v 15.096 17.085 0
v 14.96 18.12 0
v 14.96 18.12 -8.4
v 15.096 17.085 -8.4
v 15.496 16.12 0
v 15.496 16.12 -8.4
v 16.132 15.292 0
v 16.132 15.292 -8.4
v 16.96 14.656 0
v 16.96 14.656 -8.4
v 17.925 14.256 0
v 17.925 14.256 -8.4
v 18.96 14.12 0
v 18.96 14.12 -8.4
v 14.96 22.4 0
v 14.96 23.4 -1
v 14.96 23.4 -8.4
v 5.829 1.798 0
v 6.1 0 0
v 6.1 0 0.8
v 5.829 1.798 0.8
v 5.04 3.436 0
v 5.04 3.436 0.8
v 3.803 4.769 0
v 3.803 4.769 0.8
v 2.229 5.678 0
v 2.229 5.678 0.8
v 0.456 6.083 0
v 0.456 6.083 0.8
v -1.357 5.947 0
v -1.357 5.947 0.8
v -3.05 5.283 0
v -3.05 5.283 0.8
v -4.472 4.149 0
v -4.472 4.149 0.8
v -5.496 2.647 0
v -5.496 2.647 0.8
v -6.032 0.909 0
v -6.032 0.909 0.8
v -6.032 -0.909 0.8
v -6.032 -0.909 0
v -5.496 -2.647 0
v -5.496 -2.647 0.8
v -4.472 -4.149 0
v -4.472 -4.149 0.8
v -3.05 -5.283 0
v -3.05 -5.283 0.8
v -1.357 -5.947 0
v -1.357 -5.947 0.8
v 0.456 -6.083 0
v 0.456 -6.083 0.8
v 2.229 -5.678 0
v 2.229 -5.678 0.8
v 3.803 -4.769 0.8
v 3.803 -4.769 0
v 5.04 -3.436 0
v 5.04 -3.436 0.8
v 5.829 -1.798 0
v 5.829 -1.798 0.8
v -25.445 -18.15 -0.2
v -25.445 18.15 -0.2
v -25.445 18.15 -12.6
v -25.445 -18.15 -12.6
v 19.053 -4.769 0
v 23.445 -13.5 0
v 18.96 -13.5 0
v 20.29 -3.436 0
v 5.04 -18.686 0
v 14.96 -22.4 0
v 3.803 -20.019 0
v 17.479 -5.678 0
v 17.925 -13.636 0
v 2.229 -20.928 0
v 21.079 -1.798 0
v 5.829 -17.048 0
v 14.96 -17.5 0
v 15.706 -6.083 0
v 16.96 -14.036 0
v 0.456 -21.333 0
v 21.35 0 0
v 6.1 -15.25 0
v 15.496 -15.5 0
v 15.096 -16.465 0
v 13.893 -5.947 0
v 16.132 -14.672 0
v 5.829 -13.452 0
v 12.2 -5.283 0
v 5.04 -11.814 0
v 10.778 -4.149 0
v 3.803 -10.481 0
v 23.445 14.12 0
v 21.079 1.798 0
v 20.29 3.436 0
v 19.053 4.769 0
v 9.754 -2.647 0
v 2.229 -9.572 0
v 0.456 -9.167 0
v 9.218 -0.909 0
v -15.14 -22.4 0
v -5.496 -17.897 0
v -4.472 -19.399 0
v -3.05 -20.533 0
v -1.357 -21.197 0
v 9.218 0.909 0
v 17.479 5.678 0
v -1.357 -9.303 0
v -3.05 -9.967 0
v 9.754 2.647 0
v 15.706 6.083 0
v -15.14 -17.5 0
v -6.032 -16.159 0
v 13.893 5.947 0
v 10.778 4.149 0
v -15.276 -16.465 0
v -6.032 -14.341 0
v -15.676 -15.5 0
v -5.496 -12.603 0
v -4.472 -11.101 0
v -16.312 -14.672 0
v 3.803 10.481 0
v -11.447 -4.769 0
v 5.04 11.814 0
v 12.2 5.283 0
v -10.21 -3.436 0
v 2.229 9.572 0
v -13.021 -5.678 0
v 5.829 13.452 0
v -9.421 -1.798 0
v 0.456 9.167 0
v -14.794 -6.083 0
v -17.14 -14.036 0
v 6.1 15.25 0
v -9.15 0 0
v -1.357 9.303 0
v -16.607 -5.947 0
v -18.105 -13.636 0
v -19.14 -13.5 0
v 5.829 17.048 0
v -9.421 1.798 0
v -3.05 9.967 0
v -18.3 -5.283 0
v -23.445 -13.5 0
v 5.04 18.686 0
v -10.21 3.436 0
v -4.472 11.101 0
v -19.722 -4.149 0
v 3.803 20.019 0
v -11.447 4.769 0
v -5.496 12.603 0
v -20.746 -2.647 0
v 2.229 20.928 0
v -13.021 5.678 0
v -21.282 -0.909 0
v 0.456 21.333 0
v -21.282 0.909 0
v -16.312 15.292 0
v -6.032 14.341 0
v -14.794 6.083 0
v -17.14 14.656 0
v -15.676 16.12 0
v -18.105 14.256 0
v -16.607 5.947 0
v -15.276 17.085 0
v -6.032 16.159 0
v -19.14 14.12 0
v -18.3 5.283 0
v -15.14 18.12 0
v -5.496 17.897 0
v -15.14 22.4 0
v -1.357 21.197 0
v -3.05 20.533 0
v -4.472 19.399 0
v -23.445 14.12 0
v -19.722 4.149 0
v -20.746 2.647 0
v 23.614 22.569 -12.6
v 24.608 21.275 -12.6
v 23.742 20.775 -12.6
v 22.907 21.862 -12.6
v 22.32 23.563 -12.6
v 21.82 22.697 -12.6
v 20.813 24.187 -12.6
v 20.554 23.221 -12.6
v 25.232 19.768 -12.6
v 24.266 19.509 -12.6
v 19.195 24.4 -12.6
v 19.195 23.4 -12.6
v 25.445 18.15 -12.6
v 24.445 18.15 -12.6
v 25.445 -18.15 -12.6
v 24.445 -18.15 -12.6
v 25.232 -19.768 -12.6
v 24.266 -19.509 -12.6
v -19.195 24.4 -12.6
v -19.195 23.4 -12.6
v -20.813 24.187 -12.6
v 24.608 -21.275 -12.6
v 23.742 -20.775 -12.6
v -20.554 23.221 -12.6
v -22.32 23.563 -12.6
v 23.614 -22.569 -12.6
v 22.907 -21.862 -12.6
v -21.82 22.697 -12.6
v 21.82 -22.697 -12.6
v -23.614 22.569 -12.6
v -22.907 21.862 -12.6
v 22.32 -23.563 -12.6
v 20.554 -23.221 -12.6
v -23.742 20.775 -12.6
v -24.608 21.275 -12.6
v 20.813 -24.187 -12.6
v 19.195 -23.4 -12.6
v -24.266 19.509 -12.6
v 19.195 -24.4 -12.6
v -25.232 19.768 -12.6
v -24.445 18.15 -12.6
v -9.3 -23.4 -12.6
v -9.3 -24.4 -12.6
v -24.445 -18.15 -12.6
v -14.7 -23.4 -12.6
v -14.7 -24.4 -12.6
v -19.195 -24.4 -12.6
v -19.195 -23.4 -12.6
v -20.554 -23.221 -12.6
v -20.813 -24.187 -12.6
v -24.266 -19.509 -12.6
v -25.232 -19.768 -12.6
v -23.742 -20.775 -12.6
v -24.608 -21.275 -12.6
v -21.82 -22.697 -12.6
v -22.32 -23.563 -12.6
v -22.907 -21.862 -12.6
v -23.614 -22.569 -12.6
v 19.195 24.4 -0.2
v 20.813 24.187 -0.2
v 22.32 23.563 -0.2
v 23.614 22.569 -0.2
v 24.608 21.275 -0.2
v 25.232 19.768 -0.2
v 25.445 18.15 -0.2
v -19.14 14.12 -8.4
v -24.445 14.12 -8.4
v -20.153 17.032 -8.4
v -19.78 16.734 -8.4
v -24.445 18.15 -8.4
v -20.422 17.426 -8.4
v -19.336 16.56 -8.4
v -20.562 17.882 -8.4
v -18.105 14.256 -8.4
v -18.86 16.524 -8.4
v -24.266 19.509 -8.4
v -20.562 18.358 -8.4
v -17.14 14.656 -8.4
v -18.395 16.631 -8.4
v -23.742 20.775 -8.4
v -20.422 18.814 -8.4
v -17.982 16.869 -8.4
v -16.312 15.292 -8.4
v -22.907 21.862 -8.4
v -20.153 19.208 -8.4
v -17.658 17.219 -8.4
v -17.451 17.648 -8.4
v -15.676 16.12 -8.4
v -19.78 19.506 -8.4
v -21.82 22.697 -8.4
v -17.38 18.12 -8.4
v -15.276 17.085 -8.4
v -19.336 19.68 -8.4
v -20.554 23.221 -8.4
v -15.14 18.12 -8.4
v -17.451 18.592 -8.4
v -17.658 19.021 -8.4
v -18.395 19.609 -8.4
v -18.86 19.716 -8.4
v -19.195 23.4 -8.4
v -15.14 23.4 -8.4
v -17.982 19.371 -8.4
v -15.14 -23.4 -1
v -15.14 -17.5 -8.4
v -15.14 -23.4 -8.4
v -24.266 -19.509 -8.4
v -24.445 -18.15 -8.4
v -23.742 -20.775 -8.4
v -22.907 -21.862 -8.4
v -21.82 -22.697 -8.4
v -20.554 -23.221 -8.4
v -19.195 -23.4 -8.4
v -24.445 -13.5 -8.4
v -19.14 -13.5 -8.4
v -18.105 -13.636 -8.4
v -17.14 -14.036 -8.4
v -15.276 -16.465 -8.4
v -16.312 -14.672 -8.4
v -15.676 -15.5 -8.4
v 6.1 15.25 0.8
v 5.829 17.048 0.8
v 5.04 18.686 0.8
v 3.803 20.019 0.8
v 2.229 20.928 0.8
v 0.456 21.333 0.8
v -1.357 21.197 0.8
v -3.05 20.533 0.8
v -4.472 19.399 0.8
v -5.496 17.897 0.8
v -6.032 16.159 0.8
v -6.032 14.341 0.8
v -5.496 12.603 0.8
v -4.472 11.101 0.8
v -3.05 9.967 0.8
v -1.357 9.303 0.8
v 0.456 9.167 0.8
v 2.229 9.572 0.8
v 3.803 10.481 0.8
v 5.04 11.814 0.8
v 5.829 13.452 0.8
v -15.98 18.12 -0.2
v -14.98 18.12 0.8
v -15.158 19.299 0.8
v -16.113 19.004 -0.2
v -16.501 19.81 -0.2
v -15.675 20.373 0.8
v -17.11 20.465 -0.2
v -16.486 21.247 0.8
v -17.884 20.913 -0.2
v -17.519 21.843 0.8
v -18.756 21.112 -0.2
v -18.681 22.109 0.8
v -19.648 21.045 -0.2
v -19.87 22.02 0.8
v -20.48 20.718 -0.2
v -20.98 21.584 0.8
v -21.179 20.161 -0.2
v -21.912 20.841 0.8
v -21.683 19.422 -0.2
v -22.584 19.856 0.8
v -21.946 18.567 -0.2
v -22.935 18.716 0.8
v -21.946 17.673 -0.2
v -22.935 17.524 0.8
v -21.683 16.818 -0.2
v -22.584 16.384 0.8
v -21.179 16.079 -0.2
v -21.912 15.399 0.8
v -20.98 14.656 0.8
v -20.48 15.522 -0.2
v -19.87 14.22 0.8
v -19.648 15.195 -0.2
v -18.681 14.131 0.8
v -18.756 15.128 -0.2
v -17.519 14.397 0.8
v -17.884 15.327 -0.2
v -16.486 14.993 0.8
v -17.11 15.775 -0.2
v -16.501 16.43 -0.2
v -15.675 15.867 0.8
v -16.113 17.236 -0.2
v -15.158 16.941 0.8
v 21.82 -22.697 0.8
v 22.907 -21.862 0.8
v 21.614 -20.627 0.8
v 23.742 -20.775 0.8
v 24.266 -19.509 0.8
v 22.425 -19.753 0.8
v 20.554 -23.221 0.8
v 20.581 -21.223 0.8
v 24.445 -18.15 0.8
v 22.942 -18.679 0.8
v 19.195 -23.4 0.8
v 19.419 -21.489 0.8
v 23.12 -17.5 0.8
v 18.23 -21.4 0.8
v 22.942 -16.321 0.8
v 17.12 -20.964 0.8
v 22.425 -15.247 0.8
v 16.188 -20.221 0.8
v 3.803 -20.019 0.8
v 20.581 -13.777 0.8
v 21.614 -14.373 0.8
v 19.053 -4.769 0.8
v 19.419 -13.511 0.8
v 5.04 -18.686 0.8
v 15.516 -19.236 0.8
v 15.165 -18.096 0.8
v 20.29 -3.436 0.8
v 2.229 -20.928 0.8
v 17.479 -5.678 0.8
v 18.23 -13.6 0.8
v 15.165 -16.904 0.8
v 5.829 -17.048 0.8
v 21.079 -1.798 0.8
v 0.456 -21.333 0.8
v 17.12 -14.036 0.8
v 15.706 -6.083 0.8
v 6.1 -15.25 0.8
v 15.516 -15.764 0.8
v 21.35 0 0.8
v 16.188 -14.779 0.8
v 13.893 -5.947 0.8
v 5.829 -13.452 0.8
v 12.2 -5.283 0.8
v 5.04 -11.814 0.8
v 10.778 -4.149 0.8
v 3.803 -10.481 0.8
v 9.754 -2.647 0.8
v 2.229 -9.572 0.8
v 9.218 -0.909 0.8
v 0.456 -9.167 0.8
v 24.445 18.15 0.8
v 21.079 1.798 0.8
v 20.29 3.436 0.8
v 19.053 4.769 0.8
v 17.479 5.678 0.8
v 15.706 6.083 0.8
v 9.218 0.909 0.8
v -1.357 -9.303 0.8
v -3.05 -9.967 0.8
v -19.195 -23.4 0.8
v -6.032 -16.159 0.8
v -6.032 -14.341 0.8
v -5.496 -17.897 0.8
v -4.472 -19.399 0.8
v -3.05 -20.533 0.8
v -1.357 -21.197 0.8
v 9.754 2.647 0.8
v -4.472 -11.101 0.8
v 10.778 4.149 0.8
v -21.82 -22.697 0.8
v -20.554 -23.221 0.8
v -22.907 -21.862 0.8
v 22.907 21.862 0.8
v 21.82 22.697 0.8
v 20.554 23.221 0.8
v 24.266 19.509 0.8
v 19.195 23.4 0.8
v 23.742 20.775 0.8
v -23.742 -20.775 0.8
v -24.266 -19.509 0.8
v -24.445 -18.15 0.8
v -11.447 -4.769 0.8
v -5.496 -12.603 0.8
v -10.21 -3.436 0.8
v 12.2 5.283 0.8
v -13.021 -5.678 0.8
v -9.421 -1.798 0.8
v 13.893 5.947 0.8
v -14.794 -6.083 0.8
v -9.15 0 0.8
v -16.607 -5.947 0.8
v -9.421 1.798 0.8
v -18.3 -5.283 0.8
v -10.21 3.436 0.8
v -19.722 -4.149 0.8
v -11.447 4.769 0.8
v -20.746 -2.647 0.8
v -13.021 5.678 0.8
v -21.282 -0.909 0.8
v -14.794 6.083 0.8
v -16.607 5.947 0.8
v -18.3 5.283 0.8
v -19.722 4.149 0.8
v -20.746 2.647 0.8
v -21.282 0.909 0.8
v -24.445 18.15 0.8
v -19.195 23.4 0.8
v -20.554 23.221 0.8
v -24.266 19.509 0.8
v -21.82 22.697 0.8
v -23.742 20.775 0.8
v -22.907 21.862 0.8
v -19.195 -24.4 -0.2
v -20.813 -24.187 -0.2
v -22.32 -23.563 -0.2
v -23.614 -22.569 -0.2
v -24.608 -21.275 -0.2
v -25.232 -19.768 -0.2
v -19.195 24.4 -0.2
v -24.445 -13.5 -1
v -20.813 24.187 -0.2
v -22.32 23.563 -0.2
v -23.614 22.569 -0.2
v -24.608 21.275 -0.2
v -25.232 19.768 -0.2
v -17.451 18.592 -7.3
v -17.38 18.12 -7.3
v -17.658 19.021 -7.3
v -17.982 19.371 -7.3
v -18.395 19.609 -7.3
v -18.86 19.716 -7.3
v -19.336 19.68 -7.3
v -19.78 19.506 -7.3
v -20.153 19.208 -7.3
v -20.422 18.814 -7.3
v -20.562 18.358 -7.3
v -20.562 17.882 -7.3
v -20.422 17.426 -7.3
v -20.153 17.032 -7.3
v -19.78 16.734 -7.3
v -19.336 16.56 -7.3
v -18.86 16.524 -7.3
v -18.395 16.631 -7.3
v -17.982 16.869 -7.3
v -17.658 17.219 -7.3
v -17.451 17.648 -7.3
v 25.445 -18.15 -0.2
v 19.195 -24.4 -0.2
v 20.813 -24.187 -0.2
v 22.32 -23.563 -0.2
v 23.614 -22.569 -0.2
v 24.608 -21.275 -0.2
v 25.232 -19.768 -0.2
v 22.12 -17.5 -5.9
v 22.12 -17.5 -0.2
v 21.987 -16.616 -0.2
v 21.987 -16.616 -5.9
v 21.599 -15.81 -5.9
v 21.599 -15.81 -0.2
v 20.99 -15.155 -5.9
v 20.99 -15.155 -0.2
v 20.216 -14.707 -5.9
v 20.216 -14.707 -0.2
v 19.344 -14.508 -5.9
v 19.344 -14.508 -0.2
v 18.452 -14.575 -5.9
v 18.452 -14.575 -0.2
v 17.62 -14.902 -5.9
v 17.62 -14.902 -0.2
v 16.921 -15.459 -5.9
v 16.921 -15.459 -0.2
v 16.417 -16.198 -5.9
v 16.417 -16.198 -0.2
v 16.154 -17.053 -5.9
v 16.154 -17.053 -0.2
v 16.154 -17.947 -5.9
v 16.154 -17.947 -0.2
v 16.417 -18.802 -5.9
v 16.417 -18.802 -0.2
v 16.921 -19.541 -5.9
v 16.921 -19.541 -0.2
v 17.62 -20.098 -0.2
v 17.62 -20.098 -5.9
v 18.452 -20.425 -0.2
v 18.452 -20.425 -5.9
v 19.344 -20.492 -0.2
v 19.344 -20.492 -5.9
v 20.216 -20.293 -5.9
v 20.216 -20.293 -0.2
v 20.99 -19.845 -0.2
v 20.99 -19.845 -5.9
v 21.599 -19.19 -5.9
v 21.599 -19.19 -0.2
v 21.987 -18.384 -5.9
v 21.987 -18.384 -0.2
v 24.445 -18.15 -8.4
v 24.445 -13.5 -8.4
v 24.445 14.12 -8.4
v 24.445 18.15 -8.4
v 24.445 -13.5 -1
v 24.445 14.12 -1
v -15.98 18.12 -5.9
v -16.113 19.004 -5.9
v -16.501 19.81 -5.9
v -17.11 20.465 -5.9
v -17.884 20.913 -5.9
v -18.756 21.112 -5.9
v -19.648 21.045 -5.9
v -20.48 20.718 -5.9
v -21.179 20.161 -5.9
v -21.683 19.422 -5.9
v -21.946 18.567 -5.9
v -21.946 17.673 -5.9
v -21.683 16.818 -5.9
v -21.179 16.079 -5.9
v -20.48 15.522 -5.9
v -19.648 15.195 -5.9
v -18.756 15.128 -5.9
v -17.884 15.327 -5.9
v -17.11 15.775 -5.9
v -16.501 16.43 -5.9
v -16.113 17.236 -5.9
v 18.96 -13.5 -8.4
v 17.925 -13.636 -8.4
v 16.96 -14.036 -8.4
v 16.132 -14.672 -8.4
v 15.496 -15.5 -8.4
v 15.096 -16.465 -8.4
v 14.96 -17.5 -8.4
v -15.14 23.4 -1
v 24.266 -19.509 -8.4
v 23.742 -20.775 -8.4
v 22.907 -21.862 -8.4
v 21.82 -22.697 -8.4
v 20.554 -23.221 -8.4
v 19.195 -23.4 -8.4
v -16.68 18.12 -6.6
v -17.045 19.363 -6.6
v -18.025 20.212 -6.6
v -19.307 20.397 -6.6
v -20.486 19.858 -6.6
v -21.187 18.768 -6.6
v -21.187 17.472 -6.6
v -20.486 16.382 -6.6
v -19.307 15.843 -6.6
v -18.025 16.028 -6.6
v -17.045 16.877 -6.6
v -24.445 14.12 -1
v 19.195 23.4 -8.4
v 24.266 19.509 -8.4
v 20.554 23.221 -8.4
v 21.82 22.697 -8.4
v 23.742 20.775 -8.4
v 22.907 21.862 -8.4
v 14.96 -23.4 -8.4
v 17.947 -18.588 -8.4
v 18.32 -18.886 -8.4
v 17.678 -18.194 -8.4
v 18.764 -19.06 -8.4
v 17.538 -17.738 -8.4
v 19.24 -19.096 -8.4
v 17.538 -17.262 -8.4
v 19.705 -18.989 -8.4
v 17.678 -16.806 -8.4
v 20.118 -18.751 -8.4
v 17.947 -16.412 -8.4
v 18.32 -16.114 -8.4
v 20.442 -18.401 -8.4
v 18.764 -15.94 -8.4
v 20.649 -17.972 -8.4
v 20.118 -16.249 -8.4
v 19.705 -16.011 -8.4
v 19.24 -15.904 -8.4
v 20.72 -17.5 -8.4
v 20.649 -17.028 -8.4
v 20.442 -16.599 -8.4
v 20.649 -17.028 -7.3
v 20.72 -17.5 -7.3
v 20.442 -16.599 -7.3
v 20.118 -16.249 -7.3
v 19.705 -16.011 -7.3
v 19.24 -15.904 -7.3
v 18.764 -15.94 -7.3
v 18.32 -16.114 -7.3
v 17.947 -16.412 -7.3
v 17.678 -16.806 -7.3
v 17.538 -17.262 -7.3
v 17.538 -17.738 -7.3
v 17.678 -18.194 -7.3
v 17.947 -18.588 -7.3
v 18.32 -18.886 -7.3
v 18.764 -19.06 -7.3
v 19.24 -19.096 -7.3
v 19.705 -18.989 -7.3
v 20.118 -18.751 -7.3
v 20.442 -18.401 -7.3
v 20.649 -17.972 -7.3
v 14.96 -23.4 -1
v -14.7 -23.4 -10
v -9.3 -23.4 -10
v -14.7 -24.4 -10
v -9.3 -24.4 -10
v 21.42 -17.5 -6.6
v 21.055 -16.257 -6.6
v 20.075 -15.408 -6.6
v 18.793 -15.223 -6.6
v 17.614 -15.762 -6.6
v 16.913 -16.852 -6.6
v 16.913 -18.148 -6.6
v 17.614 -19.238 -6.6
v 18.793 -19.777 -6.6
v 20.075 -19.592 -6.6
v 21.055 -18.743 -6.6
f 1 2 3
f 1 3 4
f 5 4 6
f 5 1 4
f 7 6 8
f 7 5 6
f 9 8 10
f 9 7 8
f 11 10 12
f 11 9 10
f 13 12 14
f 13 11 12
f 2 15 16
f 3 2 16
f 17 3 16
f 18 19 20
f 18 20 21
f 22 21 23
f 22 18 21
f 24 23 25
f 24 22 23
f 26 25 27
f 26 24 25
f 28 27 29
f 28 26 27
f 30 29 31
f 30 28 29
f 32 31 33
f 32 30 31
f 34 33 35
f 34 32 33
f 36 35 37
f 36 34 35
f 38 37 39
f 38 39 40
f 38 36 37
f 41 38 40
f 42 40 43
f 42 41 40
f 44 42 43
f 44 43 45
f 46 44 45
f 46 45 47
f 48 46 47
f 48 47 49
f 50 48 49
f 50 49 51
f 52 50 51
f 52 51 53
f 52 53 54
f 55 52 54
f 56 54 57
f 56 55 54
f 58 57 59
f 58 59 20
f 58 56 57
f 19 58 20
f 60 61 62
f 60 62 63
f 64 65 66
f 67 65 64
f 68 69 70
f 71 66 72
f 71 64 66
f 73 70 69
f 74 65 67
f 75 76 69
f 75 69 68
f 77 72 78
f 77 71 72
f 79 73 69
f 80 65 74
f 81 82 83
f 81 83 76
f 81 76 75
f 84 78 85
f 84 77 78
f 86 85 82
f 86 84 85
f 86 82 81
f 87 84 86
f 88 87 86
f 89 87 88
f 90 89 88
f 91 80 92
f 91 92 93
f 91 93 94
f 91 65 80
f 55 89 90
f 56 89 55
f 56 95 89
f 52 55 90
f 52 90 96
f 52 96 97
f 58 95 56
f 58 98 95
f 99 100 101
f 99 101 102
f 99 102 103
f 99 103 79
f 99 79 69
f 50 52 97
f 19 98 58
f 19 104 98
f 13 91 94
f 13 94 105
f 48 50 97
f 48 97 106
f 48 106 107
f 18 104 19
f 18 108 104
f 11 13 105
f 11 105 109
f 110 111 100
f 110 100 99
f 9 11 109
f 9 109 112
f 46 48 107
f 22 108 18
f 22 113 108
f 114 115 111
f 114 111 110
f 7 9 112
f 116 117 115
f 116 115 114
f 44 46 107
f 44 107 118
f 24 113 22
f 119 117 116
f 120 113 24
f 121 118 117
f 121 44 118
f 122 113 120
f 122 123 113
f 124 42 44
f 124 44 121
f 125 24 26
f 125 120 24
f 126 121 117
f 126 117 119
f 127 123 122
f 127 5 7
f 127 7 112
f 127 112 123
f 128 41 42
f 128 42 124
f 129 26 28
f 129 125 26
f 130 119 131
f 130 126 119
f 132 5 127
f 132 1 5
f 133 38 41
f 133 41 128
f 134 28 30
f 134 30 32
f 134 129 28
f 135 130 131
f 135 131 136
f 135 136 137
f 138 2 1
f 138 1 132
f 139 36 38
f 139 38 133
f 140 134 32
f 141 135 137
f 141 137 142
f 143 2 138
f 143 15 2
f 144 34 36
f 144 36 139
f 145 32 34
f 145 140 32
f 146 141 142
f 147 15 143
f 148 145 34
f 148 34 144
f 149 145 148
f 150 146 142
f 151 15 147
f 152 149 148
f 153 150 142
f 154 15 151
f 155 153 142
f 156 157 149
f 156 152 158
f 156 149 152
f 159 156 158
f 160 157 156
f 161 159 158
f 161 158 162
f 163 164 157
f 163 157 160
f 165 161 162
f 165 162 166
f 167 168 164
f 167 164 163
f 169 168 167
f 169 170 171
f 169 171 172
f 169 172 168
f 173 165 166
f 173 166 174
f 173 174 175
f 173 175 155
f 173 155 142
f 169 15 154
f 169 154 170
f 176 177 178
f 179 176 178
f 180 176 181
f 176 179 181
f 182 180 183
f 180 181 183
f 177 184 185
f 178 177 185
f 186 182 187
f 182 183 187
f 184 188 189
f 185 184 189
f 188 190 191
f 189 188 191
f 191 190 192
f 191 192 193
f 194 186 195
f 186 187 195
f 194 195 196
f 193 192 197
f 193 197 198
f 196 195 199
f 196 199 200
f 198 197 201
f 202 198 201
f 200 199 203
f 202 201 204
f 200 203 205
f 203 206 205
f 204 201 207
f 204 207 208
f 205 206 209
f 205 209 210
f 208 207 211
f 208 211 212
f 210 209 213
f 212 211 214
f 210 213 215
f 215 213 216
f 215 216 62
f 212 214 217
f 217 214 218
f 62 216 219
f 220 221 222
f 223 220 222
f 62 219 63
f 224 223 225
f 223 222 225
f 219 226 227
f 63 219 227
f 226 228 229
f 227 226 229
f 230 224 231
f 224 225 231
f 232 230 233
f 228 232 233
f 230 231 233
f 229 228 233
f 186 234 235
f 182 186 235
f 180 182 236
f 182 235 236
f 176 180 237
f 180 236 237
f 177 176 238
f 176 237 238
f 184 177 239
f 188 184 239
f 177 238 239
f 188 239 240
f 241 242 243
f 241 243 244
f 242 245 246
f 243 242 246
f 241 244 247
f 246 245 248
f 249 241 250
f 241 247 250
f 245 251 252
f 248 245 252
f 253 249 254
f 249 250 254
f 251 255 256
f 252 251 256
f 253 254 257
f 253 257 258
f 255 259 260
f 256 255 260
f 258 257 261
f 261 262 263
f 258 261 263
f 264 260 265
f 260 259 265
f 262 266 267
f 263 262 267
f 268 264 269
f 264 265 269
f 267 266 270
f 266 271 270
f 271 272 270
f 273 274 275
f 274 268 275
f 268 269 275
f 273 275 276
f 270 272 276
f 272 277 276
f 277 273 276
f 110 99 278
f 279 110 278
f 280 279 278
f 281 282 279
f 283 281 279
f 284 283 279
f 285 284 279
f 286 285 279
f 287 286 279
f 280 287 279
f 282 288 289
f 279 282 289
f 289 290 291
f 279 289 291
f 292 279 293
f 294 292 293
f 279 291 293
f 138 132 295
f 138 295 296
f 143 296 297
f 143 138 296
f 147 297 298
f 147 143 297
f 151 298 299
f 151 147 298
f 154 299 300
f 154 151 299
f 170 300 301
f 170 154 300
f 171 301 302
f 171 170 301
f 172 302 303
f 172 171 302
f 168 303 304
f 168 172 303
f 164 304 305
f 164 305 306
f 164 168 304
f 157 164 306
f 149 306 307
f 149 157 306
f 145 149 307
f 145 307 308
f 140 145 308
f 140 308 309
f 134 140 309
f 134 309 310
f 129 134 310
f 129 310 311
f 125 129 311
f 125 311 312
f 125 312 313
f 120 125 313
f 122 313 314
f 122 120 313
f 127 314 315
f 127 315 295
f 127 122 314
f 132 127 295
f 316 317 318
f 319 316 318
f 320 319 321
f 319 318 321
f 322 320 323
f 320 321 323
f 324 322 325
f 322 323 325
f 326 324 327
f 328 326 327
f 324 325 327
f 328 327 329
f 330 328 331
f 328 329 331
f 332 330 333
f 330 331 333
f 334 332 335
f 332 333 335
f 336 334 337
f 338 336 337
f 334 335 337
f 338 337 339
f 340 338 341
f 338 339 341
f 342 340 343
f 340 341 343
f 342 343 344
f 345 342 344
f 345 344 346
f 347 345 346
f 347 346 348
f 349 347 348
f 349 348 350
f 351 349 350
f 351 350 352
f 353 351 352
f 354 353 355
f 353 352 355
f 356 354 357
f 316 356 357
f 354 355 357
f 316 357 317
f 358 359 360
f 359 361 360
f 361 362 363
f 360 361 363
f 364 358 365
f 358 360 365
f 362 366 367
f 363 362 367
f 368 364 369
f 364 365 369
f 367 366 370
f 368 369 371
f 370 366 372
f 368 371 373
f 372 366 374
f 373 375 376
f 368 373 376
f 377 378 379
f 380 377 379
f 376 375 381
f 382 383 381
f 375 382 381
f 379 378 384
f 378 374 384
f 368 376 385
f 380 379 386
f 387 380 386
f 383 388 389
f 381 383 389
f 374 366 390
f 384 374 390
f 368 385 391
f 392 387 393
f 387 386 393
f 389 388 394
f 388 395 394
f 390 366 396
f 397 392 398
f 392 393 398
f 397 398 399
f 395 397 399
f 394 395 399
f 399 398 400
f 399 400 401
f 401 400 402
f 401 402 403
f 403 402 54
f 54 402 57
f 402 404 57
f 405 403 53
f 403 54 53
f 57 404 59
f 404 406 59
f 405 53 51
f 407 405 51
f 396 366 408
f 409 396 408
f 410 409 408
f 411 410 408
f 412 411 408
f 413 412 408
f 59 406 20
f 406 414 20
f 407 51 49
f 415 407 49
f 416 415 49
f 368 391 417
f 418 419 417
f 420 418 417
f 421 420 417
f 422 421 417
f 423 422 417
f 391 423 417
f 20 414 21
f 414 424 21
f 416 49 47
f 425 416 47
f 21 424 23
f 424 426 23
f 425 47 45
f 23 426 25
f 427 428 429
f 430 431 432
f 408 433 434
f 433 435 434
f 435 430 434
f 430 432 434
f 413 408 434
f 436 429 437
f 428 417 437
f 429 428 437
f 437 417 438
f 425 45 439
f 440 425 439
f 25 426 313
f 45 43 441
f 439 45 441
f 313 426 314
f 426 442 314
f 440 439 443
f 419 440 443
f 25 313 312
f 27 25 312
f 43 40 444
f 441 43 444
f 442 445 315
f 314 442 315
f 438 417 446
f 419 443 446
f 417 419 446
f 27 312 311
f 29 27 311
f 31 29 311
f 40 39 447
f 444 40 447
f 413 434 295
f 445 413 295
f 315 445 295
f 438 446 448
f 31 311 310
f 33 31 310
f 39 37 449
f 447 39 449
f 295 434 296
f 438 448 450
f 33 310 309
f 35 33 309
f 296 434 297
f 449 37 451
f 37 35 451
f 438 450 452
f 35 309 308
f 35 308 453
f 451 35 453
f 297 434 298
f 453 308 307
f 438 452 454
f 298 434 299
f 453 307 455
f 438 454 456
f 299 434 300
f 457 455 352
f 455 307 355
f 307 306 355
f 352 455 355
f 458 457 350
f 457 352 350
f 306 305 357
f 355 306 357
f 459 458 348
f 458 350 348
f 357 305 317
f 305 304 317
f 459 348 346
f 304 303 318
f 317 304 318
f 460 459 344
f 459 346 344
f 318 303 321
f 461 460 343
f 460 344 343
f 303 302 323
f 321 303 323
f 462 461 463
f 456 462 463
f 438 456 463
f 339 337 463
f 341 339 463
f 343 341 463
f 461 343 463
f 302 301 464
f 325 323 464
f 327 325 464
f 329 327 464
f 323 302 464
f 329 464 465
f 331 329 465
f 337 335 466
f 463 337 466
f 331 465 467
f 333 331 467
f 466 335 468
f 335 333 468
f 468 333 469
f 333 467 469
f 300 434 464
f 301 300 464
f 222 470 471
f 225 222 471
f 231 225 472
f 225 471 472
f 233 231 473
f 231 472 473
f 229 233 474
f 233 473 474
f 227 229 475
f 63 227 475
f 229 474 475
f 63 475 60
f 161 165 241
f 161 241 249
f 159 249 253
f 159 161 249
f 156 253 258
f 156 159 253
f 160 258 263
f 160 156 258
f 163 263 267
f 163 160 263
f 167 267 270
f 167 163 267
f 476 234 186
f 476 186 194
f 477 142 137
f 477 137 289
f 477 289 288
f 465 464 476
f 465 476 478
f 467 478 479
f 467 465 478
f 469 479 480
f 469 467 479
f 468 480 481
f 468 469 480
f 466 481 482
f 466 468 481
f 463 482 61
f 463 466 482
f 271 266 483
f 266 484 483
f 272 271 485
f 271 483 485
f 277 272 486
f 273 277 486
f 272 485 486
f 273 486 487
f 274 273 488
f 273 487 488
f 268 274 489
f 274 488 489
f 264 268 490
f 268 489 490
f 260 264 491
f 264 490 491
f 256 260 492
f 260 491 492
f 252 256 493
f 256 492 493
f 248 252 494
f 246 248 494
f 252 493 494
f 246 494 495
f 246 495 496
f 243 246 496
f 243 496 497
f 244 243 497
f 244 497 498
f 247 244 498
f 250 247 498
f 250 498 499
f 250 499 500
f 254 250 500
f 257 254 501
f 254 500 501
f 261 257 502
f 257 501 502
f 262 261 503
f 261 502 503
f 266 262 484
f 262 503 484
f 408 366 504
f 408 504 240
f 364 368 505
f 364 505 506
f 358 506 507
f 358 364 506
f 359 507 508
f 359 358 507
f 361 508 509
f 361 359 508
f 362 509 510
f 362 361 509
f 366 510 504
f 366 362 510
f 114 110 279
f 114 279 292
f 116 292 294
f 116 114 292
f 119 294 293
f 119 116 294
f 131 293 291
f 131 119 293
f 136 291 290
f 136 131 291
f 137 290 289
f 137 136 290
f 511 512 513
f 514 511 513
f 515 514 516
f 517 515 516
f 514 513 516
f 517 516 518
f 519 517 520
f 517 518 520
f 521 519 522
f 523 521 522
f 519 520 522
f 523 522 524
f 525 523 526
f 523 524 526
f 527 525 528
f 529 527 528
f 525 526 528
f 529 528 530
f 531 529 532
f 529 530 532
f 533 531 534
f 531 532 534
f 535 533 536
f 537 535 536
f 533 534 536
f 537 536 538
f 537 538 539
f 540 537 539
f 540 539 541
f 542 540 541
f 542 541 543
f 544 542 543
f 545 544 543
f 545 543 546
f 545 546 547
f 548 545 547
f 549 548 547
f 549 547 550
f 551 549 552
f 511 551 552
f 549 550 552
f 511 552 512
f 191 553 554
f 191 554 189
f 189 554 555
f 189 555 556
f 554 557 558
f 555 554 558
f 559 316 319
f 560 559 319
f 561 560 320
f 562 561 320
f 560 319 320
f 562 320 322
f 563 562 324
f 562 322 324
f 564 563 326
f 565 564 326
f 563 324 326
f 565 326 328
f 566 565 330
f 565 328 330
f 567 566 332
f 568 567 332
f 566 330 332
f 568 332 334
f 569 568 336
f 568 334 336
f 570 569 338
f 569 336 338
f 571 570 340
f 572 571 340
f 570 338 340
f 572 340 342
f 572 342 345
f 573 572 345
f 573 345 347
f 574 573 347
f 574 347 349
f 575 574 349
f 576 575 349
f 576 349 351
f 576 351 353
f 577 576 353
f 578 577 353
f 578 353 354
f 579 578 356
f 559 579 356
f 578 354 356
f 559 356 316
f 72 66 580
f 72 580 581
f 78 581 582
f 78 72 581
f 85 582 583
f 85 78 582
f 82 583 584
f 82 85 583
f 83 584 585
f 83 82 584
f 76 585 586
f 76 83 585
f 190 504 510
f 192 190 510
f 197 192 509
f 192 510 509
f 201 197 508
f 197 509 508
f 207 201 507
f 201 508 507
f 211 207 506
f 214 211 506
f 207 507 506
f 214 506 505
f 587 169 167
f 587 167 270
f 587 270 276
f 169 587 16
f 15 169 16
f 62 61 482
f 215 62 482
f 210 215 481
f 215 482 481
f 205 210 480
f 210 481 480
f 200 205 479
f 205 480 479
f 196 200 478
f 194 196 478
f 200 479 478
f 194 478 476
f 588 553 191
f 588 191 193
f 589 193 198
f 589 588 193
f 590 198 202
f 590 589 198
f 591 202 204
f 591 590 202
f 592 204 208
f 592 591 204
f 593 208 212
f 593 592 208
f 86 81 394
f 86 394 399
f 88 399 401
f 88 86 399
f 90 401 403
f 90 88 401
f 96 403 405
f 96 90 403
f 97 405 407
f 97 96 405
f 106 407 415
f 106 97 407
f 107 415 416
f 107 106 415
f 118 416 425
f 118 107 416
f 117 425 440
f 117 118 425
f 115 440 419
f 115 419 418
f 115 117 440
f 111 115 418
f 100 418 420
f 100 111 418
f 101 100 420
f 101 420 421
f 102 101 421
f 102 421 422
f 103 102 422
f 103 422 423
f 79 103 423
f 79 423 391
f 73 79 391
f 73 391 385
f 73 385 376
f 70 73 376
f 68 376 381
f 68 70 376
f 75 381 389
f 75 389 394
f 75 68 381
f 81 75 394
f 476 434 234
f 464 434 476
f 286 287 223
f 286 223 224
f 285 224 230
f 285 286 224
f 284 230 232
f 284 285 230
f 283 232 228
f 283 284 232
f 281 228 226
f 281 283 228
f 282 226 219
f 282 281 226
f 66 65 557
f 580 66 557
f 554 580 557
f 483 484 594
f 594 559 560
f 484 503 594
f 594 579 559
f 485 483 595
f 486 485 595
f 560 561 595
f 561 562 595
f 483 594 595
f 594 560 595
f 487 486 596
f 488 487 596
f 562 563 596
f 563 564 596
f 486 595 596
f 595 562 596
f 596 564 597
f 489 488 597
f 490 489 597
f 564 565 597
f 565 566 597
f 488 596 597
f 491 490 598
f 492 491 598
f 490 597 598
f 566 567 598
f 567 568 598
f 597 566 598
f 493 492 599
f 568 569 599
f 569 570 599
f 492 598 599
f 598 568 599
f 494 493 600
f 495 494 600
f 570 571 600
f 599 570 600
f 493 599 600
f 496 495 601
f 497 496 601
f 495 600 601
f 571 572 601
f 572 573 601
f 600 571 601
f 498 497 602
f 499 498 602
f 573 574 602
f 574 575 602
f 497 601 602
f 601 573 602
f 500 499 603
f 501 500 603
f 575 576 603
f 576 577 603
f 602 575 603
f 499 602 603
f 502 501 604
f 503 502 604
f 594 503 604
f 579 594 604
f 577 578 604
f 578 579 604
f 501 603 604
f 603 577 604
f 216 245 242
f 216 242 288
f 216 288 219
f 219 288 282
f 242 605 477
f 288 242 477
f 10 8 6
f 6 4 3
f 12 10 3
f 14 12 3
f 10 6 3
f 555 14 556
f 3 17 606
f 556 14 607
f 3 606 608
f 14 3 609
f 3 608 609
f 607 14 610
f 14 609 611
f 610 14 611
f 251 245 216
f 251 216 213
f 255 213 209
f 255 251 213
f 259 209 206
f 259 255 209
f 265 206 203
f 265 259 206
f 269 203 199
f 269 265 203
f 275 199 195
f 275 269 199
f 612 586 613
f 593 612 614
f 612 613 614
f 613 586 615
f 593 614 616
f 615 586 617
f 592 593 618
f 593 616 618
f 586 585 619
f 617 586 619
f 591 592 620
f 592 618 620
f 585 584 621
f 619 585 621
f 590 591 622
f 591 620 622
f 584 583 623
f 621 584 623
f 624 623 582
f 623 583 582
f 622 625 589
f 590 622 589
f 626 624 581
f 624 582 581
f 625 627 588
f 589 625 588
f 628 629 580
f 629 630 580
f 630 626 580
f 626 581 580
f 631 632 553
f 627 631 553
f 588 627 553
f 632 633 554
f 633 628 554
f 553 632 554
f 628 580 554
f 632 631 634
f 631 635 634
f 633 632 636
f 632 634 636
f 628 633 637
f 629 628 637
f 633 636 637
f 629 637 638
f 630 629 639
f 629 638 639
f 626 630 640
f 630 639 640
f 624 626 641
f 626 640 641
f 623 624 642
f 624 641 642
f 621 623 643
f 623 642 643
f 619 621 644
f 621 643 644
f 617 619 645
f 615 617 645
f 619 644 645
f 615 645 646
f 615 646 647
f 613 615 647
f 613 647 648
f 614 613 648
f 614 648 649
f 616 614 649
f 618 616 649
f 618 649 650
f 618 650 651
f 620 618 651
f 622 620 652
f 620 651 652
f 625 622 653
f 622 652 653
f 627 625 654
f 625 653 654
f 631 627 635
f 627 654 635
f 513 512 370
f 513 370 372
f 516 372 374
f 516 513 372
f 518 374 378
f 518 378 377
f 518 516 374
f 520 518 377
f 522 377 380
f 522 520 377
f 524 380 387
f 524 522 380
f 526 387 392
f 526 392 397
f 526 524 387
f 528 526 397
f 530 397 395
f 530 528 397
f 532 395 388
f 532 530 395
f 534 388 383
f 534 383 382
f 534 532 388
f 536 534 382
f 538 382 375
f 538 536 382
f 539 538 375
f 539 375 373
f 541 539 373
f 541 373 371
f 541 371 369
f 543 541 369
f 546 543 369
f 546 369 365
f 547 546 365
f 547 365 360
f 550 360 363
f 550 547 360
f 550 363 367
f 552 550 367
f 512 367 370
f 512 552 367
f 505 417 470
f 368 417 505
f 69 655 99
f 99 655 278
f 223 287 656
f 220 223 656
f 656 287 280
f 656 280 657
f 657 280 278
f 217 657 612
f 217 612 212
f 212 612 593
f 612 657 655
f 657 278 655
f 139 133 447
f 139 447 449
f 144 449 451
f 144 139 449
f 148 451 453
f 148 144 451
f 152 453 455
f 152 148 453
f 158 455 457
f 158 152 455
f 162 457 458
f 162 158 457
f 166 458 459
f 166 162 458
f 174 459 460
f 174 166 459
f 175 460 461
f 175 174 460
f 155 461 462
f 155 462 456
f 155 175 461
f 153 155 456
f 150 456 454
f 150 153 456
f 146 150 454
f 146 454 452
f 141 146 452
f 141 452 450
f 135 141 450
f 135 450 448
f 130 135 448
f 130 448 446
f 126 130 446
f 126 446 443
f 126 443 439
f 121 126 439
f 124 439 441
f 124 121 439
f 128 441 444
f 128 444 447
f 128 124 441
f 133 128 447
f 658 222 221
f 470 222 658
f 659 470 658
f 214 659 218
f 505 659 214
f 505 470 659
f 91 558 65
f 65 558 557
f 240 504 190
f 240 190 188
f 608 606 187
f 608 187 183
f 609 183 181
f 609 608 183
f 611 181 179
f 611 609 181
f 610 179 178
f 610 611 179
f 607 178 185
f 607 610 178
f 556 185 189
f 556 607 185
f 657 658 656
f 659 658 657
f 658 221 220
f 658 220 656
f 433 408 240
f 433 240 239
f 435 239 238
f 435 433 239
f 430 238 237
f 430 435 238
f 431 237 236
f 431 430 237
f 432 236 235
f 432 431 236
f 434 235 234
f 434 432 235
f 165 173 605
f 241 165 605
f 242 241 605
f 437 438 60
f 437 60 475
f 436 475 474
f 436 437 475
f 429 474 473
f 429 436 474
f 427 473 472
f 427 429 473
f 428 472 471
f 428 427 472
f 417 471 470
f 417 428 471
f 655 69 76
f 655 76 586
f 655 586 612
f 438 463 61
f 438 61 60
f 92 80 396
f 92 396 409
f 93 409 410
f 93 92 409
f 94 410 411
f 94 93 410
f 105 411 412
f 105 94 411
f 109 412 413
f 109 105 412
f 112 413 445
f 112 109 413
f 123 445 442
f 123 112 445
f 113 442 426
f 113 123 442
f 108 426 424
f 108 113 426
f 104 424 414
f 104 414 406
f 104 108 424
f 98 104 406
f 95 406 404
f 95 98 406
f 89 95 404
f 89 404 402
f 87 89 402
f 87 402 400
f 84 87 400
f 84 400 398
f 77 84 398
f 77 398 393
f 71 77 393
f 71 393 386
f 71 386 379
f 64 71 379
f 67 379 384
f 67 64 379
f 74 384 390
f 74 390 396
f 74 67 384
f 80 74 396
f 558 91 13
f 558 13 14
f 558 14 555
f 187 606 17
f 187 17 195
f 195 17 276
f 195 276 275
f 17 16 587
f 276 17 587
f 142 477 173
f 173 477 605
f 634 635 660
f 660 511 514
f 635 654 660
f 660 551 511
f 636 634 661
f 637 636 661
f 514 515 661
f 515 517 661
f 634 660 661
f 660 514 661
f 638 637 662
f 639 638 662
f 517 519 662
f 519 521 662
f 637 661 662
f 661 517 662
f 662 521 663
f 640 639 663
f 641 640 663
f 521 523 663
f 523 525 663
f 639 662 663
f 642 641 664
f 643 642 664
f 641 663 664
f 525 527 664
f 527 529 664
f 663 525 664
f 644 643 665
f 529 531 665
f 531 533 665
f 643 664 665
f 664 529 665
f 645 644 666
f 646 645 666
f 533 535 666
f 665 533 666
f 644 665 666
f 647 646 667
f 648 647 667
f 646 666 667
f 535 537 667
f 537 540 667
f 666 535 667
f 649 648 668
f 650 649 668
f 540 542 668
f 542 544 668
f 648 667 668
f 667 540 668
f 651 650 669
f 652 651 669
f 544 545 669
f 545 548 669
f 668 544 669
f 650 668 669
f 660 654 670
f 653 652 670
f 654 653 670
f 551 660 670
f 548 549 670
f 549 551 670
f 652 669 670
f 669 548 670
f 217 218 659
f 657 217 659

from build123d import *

# Parameters (mm, degrees)
SKETCH_R        = 6.1
PAD_DEPTH       = 0.8
PAD001_DEPTH    = 12.6
CHAMFER_SIZE    = 1
PAD002_DEPTH    = 8.4
SKETCH003_W     = 5.4
SKETCH003_H     = 2.7
POCKET_DEPTH    = 2
CHAMFER001_SIZE = 1


with BuildPart() as part:
    # Sketch → Pad (new body)
    with BuildSketch(Plane.XY):
        with BuildLine():
            Line((-19.195, 24.4), (19.195, 24.4))
            ThreePointArc((25.445, 18.15), (23.614417, 22.569417), (19.195, 24.4))
            Line((25.445, 18.15), (25.445, -18.15))
            ThreePointArc((19.195, -24.4), (23.614417, -22.569417), (25.445, -18.15))
            Line((19.195, -24.4), (-19.195, -24.4))
            ThreePointArc((-25.445, -18.15), (-23.614417, -22.569417), (-19.195, -24.4))
            Line((-25.445, -18.15), (-25.445, 18.15))
            ThreePointArc((-19.195, 24.4), (-23.614417, 22.569417), (-25.445, 18.15))
        make_face()
        with Locations((-15.25, 0)):
            Circle(SKETCH_R, mode=Mode.SUBTRACT)
        Circle(SKETCH_R, mode=Mode.SUBTRACT)
        with Locations((15.25, 0)):
            Circle(SKETCH_R, mode=Mode.SUBTRACT)
        with Locations((0, 15.25)):
            Circle(SKETCH_R, mode=Mode.SUBTRACT)
        with Locations((0, -15.25)):
            Circle(SKETCH_R, mode=Mode.SUBTRACT)
    extrude(amount=PAD_DEPTH)

    # Sketch005 (on Face14 of Pad) → Pad001 (join)
    with BuildSketch(Plane(origin=(0, 0, 0), x_dir=(1, 0, 0), z_dir=(0, 0, -1))):
        with BuildLine():
            Line((-19.195, 24.4), (19.195, 24.4))
            ThreePointArc((25.445, 18.15), (23.614417, 22.569417), (19.195, 24.4))
            Line((25.445, 18.15), (25.445, -18.15))
            ThreePointArc((19.195, -24.4), (23.614417, -22.569417), (25.445, -18.15))
            Line((19.195, -24.4), (-19.195, -24.4))
            ThreePointArc((-25.445, -18.15), (-23.614417, -22.569417), (-19.195, -24.4))
            Line((-25.445, -18.15), (-25.445, 18.15))
            ThreePointArc((-19.195, 24.4), (-23.614417, 22.569417), (-25.445, 18.15))
        make_face()
        with BuildLine():
            Line((-19.195, 23.4), (19.195, 23.4))
            ThreePointArc((24.445, 18.15), (22.907311, 21.862311), (19.195, 23.4))
            Line((24.445, 18.15), (24.445, -18.15))
            ThreePointArc((19.195, -23.4), (22.907311, -21.862311), (24.445, -18.15))
            Line((19.195, -23.4), (-19.195, -23.4))
            ThreePointArc((-24.445, -18.15), (-22.907311, -21.862311), (-19.195, -23.4))
            Line((-24.445, -18.15), (-24.445, 18.15))
            ThreePointArc((-19.195, 23.4), (-22.907311, 21.862311), (-24.445, 18.15))
        make_face(mode=Mode.SUBTRACT)
    extrude(amount=PAD001_DEPTH)

    # Chamfer
    chamfer_edges = [part.edges().sort_by_distance(p)[0] for p in [
        (-22.907311, 21.862311, 0),
        (23.614417, 22.569417, 0.8),
    ]]
    chamfer(chamfer_edges, length=CHAMFER_SIZE)

    # Sketch006 → Pad002 (join)
    with BuildSketch(Plane.XY):
        with BuildLine():
            ThreePointArc((-19.195, 23.4), (-22.907311, 21.862311), (-24.445, 18.15))
            Line((-24.445, 18.15), (-24.445, 14.12))
            Line((-19.14, 14.12), (-24.445, 14.12))
            ThreePointArc((-19.14, 14.12), (-16.311573, 15.291573), (-15.14, 18.12))
            Line((-15.14, 18.12), (-15.14, 23.4))
            Line((-19.195, 23.4), (-15.14, 23.4))
        make_face()
        with BuildLine():
            ThreePointArc((24.445, 18.15), (22.907311, 21.862311), (19.195, 23.4))
            Line((14.96, 23.4), (19.195, 23.4))
            Line((14.96, 18.12), (14.96, 23.4))
            ThreePointArc((14.96, 18.12), (16.131573, 15.291573), (18.96, 14.12))
            Line((18.96, 14.12), (24.445, 14.12))
            Line((24.445, 18.15), (24.445, 14.12))
        make_face()
        with BuildLine():
            ThreePointArc((19.195, -23.4), (22.907311, -21.862311), (24.445, -18.15))
            Line((24.445, -13.5), (24.445, -18.15))
            Line((18.96, -13.5), (24.445, -13.5))
            ThreePointArc((18.96, -13.5), (16.131573, -14.671573), (14.96, -17.5))
            Line((14.96, -17.5), (14.96, -23.4))
            Line((14.96, -23.4), (19.195, -23.4))
        make_face()
        with BuildLine():
            ThreePointArc((-24.445, -18.15), (-22.907311, -21.862311), (-19.195, -23.4))
            Line((-19.195, -23.4), (-15.14, -23.4))
            Line((-15.14, -17.5), (-15.14, -23.4))
            ThreePointArc((-15.14, -17.5), (-16.311573, -14.671573), (-19.14, -13.5))
            Line((-19.14, -13.5), (-24.445, -13.5))
            Line((-24.445, -13.5), (-24.445, -18.15))
        make_face()
    extrude(amount=-PAD002_DEPTH)

    # Sketch004 → Groove (revolve, cut)
    with BuildSketch(Plane(origin=(-18.98, 18.12, 0), x_dir=(1, 0, 0), z_dir=(0, -1, 0))):
        Polygon((3, 2), (0, 2), (0, -11), (1.6, -11), (1.6, -7.3), (3, -5.9), align=None)
    revolve(axis=Axis((-18.98, 18.12, 0), (0, 0, 1)), mode=Mode.SUBTRACT)

    # Sketch007 → Groove001 (revolve, cut)
    with BuildSketch(Plane(origin=(19.12, -17.5, 0), x_dir=(1, 0, 0), z_dir=(0, -1, 0))):
        Polygon((0, -11), (1.6, -11), (1.6, -7.3), (3, -5.9), (3, 2), (0, 2), align=None)
    revolve(axis=Axis((19.12, -17.5, 0), (0, 0, 1)), mode=Mode.SUBTRACT)

    # Sketch003 (on Face16 of Groove001) → Pocket (cut)
    with BuildSketch(Plane.XZ.offset(24.4)):
        with Locations((-12, -11.35)):
            Rectangle(SKETCH003_W, SKETCH003_H)
    extrude(amount=-POCKET_DEPTH, mode=Mode.SUBTRACT)

    # Chamfer001
    chamfer001_edges = [part.edges().sort_by_distance(p)[0] for p in [
        (16.12, -17.5, 0.8),
        (-21.98, 18.12, 0.8),
    ]]
    chamfer(chamfer001_edges, length=CHAMFER001_SIZE)


solid = part.part
